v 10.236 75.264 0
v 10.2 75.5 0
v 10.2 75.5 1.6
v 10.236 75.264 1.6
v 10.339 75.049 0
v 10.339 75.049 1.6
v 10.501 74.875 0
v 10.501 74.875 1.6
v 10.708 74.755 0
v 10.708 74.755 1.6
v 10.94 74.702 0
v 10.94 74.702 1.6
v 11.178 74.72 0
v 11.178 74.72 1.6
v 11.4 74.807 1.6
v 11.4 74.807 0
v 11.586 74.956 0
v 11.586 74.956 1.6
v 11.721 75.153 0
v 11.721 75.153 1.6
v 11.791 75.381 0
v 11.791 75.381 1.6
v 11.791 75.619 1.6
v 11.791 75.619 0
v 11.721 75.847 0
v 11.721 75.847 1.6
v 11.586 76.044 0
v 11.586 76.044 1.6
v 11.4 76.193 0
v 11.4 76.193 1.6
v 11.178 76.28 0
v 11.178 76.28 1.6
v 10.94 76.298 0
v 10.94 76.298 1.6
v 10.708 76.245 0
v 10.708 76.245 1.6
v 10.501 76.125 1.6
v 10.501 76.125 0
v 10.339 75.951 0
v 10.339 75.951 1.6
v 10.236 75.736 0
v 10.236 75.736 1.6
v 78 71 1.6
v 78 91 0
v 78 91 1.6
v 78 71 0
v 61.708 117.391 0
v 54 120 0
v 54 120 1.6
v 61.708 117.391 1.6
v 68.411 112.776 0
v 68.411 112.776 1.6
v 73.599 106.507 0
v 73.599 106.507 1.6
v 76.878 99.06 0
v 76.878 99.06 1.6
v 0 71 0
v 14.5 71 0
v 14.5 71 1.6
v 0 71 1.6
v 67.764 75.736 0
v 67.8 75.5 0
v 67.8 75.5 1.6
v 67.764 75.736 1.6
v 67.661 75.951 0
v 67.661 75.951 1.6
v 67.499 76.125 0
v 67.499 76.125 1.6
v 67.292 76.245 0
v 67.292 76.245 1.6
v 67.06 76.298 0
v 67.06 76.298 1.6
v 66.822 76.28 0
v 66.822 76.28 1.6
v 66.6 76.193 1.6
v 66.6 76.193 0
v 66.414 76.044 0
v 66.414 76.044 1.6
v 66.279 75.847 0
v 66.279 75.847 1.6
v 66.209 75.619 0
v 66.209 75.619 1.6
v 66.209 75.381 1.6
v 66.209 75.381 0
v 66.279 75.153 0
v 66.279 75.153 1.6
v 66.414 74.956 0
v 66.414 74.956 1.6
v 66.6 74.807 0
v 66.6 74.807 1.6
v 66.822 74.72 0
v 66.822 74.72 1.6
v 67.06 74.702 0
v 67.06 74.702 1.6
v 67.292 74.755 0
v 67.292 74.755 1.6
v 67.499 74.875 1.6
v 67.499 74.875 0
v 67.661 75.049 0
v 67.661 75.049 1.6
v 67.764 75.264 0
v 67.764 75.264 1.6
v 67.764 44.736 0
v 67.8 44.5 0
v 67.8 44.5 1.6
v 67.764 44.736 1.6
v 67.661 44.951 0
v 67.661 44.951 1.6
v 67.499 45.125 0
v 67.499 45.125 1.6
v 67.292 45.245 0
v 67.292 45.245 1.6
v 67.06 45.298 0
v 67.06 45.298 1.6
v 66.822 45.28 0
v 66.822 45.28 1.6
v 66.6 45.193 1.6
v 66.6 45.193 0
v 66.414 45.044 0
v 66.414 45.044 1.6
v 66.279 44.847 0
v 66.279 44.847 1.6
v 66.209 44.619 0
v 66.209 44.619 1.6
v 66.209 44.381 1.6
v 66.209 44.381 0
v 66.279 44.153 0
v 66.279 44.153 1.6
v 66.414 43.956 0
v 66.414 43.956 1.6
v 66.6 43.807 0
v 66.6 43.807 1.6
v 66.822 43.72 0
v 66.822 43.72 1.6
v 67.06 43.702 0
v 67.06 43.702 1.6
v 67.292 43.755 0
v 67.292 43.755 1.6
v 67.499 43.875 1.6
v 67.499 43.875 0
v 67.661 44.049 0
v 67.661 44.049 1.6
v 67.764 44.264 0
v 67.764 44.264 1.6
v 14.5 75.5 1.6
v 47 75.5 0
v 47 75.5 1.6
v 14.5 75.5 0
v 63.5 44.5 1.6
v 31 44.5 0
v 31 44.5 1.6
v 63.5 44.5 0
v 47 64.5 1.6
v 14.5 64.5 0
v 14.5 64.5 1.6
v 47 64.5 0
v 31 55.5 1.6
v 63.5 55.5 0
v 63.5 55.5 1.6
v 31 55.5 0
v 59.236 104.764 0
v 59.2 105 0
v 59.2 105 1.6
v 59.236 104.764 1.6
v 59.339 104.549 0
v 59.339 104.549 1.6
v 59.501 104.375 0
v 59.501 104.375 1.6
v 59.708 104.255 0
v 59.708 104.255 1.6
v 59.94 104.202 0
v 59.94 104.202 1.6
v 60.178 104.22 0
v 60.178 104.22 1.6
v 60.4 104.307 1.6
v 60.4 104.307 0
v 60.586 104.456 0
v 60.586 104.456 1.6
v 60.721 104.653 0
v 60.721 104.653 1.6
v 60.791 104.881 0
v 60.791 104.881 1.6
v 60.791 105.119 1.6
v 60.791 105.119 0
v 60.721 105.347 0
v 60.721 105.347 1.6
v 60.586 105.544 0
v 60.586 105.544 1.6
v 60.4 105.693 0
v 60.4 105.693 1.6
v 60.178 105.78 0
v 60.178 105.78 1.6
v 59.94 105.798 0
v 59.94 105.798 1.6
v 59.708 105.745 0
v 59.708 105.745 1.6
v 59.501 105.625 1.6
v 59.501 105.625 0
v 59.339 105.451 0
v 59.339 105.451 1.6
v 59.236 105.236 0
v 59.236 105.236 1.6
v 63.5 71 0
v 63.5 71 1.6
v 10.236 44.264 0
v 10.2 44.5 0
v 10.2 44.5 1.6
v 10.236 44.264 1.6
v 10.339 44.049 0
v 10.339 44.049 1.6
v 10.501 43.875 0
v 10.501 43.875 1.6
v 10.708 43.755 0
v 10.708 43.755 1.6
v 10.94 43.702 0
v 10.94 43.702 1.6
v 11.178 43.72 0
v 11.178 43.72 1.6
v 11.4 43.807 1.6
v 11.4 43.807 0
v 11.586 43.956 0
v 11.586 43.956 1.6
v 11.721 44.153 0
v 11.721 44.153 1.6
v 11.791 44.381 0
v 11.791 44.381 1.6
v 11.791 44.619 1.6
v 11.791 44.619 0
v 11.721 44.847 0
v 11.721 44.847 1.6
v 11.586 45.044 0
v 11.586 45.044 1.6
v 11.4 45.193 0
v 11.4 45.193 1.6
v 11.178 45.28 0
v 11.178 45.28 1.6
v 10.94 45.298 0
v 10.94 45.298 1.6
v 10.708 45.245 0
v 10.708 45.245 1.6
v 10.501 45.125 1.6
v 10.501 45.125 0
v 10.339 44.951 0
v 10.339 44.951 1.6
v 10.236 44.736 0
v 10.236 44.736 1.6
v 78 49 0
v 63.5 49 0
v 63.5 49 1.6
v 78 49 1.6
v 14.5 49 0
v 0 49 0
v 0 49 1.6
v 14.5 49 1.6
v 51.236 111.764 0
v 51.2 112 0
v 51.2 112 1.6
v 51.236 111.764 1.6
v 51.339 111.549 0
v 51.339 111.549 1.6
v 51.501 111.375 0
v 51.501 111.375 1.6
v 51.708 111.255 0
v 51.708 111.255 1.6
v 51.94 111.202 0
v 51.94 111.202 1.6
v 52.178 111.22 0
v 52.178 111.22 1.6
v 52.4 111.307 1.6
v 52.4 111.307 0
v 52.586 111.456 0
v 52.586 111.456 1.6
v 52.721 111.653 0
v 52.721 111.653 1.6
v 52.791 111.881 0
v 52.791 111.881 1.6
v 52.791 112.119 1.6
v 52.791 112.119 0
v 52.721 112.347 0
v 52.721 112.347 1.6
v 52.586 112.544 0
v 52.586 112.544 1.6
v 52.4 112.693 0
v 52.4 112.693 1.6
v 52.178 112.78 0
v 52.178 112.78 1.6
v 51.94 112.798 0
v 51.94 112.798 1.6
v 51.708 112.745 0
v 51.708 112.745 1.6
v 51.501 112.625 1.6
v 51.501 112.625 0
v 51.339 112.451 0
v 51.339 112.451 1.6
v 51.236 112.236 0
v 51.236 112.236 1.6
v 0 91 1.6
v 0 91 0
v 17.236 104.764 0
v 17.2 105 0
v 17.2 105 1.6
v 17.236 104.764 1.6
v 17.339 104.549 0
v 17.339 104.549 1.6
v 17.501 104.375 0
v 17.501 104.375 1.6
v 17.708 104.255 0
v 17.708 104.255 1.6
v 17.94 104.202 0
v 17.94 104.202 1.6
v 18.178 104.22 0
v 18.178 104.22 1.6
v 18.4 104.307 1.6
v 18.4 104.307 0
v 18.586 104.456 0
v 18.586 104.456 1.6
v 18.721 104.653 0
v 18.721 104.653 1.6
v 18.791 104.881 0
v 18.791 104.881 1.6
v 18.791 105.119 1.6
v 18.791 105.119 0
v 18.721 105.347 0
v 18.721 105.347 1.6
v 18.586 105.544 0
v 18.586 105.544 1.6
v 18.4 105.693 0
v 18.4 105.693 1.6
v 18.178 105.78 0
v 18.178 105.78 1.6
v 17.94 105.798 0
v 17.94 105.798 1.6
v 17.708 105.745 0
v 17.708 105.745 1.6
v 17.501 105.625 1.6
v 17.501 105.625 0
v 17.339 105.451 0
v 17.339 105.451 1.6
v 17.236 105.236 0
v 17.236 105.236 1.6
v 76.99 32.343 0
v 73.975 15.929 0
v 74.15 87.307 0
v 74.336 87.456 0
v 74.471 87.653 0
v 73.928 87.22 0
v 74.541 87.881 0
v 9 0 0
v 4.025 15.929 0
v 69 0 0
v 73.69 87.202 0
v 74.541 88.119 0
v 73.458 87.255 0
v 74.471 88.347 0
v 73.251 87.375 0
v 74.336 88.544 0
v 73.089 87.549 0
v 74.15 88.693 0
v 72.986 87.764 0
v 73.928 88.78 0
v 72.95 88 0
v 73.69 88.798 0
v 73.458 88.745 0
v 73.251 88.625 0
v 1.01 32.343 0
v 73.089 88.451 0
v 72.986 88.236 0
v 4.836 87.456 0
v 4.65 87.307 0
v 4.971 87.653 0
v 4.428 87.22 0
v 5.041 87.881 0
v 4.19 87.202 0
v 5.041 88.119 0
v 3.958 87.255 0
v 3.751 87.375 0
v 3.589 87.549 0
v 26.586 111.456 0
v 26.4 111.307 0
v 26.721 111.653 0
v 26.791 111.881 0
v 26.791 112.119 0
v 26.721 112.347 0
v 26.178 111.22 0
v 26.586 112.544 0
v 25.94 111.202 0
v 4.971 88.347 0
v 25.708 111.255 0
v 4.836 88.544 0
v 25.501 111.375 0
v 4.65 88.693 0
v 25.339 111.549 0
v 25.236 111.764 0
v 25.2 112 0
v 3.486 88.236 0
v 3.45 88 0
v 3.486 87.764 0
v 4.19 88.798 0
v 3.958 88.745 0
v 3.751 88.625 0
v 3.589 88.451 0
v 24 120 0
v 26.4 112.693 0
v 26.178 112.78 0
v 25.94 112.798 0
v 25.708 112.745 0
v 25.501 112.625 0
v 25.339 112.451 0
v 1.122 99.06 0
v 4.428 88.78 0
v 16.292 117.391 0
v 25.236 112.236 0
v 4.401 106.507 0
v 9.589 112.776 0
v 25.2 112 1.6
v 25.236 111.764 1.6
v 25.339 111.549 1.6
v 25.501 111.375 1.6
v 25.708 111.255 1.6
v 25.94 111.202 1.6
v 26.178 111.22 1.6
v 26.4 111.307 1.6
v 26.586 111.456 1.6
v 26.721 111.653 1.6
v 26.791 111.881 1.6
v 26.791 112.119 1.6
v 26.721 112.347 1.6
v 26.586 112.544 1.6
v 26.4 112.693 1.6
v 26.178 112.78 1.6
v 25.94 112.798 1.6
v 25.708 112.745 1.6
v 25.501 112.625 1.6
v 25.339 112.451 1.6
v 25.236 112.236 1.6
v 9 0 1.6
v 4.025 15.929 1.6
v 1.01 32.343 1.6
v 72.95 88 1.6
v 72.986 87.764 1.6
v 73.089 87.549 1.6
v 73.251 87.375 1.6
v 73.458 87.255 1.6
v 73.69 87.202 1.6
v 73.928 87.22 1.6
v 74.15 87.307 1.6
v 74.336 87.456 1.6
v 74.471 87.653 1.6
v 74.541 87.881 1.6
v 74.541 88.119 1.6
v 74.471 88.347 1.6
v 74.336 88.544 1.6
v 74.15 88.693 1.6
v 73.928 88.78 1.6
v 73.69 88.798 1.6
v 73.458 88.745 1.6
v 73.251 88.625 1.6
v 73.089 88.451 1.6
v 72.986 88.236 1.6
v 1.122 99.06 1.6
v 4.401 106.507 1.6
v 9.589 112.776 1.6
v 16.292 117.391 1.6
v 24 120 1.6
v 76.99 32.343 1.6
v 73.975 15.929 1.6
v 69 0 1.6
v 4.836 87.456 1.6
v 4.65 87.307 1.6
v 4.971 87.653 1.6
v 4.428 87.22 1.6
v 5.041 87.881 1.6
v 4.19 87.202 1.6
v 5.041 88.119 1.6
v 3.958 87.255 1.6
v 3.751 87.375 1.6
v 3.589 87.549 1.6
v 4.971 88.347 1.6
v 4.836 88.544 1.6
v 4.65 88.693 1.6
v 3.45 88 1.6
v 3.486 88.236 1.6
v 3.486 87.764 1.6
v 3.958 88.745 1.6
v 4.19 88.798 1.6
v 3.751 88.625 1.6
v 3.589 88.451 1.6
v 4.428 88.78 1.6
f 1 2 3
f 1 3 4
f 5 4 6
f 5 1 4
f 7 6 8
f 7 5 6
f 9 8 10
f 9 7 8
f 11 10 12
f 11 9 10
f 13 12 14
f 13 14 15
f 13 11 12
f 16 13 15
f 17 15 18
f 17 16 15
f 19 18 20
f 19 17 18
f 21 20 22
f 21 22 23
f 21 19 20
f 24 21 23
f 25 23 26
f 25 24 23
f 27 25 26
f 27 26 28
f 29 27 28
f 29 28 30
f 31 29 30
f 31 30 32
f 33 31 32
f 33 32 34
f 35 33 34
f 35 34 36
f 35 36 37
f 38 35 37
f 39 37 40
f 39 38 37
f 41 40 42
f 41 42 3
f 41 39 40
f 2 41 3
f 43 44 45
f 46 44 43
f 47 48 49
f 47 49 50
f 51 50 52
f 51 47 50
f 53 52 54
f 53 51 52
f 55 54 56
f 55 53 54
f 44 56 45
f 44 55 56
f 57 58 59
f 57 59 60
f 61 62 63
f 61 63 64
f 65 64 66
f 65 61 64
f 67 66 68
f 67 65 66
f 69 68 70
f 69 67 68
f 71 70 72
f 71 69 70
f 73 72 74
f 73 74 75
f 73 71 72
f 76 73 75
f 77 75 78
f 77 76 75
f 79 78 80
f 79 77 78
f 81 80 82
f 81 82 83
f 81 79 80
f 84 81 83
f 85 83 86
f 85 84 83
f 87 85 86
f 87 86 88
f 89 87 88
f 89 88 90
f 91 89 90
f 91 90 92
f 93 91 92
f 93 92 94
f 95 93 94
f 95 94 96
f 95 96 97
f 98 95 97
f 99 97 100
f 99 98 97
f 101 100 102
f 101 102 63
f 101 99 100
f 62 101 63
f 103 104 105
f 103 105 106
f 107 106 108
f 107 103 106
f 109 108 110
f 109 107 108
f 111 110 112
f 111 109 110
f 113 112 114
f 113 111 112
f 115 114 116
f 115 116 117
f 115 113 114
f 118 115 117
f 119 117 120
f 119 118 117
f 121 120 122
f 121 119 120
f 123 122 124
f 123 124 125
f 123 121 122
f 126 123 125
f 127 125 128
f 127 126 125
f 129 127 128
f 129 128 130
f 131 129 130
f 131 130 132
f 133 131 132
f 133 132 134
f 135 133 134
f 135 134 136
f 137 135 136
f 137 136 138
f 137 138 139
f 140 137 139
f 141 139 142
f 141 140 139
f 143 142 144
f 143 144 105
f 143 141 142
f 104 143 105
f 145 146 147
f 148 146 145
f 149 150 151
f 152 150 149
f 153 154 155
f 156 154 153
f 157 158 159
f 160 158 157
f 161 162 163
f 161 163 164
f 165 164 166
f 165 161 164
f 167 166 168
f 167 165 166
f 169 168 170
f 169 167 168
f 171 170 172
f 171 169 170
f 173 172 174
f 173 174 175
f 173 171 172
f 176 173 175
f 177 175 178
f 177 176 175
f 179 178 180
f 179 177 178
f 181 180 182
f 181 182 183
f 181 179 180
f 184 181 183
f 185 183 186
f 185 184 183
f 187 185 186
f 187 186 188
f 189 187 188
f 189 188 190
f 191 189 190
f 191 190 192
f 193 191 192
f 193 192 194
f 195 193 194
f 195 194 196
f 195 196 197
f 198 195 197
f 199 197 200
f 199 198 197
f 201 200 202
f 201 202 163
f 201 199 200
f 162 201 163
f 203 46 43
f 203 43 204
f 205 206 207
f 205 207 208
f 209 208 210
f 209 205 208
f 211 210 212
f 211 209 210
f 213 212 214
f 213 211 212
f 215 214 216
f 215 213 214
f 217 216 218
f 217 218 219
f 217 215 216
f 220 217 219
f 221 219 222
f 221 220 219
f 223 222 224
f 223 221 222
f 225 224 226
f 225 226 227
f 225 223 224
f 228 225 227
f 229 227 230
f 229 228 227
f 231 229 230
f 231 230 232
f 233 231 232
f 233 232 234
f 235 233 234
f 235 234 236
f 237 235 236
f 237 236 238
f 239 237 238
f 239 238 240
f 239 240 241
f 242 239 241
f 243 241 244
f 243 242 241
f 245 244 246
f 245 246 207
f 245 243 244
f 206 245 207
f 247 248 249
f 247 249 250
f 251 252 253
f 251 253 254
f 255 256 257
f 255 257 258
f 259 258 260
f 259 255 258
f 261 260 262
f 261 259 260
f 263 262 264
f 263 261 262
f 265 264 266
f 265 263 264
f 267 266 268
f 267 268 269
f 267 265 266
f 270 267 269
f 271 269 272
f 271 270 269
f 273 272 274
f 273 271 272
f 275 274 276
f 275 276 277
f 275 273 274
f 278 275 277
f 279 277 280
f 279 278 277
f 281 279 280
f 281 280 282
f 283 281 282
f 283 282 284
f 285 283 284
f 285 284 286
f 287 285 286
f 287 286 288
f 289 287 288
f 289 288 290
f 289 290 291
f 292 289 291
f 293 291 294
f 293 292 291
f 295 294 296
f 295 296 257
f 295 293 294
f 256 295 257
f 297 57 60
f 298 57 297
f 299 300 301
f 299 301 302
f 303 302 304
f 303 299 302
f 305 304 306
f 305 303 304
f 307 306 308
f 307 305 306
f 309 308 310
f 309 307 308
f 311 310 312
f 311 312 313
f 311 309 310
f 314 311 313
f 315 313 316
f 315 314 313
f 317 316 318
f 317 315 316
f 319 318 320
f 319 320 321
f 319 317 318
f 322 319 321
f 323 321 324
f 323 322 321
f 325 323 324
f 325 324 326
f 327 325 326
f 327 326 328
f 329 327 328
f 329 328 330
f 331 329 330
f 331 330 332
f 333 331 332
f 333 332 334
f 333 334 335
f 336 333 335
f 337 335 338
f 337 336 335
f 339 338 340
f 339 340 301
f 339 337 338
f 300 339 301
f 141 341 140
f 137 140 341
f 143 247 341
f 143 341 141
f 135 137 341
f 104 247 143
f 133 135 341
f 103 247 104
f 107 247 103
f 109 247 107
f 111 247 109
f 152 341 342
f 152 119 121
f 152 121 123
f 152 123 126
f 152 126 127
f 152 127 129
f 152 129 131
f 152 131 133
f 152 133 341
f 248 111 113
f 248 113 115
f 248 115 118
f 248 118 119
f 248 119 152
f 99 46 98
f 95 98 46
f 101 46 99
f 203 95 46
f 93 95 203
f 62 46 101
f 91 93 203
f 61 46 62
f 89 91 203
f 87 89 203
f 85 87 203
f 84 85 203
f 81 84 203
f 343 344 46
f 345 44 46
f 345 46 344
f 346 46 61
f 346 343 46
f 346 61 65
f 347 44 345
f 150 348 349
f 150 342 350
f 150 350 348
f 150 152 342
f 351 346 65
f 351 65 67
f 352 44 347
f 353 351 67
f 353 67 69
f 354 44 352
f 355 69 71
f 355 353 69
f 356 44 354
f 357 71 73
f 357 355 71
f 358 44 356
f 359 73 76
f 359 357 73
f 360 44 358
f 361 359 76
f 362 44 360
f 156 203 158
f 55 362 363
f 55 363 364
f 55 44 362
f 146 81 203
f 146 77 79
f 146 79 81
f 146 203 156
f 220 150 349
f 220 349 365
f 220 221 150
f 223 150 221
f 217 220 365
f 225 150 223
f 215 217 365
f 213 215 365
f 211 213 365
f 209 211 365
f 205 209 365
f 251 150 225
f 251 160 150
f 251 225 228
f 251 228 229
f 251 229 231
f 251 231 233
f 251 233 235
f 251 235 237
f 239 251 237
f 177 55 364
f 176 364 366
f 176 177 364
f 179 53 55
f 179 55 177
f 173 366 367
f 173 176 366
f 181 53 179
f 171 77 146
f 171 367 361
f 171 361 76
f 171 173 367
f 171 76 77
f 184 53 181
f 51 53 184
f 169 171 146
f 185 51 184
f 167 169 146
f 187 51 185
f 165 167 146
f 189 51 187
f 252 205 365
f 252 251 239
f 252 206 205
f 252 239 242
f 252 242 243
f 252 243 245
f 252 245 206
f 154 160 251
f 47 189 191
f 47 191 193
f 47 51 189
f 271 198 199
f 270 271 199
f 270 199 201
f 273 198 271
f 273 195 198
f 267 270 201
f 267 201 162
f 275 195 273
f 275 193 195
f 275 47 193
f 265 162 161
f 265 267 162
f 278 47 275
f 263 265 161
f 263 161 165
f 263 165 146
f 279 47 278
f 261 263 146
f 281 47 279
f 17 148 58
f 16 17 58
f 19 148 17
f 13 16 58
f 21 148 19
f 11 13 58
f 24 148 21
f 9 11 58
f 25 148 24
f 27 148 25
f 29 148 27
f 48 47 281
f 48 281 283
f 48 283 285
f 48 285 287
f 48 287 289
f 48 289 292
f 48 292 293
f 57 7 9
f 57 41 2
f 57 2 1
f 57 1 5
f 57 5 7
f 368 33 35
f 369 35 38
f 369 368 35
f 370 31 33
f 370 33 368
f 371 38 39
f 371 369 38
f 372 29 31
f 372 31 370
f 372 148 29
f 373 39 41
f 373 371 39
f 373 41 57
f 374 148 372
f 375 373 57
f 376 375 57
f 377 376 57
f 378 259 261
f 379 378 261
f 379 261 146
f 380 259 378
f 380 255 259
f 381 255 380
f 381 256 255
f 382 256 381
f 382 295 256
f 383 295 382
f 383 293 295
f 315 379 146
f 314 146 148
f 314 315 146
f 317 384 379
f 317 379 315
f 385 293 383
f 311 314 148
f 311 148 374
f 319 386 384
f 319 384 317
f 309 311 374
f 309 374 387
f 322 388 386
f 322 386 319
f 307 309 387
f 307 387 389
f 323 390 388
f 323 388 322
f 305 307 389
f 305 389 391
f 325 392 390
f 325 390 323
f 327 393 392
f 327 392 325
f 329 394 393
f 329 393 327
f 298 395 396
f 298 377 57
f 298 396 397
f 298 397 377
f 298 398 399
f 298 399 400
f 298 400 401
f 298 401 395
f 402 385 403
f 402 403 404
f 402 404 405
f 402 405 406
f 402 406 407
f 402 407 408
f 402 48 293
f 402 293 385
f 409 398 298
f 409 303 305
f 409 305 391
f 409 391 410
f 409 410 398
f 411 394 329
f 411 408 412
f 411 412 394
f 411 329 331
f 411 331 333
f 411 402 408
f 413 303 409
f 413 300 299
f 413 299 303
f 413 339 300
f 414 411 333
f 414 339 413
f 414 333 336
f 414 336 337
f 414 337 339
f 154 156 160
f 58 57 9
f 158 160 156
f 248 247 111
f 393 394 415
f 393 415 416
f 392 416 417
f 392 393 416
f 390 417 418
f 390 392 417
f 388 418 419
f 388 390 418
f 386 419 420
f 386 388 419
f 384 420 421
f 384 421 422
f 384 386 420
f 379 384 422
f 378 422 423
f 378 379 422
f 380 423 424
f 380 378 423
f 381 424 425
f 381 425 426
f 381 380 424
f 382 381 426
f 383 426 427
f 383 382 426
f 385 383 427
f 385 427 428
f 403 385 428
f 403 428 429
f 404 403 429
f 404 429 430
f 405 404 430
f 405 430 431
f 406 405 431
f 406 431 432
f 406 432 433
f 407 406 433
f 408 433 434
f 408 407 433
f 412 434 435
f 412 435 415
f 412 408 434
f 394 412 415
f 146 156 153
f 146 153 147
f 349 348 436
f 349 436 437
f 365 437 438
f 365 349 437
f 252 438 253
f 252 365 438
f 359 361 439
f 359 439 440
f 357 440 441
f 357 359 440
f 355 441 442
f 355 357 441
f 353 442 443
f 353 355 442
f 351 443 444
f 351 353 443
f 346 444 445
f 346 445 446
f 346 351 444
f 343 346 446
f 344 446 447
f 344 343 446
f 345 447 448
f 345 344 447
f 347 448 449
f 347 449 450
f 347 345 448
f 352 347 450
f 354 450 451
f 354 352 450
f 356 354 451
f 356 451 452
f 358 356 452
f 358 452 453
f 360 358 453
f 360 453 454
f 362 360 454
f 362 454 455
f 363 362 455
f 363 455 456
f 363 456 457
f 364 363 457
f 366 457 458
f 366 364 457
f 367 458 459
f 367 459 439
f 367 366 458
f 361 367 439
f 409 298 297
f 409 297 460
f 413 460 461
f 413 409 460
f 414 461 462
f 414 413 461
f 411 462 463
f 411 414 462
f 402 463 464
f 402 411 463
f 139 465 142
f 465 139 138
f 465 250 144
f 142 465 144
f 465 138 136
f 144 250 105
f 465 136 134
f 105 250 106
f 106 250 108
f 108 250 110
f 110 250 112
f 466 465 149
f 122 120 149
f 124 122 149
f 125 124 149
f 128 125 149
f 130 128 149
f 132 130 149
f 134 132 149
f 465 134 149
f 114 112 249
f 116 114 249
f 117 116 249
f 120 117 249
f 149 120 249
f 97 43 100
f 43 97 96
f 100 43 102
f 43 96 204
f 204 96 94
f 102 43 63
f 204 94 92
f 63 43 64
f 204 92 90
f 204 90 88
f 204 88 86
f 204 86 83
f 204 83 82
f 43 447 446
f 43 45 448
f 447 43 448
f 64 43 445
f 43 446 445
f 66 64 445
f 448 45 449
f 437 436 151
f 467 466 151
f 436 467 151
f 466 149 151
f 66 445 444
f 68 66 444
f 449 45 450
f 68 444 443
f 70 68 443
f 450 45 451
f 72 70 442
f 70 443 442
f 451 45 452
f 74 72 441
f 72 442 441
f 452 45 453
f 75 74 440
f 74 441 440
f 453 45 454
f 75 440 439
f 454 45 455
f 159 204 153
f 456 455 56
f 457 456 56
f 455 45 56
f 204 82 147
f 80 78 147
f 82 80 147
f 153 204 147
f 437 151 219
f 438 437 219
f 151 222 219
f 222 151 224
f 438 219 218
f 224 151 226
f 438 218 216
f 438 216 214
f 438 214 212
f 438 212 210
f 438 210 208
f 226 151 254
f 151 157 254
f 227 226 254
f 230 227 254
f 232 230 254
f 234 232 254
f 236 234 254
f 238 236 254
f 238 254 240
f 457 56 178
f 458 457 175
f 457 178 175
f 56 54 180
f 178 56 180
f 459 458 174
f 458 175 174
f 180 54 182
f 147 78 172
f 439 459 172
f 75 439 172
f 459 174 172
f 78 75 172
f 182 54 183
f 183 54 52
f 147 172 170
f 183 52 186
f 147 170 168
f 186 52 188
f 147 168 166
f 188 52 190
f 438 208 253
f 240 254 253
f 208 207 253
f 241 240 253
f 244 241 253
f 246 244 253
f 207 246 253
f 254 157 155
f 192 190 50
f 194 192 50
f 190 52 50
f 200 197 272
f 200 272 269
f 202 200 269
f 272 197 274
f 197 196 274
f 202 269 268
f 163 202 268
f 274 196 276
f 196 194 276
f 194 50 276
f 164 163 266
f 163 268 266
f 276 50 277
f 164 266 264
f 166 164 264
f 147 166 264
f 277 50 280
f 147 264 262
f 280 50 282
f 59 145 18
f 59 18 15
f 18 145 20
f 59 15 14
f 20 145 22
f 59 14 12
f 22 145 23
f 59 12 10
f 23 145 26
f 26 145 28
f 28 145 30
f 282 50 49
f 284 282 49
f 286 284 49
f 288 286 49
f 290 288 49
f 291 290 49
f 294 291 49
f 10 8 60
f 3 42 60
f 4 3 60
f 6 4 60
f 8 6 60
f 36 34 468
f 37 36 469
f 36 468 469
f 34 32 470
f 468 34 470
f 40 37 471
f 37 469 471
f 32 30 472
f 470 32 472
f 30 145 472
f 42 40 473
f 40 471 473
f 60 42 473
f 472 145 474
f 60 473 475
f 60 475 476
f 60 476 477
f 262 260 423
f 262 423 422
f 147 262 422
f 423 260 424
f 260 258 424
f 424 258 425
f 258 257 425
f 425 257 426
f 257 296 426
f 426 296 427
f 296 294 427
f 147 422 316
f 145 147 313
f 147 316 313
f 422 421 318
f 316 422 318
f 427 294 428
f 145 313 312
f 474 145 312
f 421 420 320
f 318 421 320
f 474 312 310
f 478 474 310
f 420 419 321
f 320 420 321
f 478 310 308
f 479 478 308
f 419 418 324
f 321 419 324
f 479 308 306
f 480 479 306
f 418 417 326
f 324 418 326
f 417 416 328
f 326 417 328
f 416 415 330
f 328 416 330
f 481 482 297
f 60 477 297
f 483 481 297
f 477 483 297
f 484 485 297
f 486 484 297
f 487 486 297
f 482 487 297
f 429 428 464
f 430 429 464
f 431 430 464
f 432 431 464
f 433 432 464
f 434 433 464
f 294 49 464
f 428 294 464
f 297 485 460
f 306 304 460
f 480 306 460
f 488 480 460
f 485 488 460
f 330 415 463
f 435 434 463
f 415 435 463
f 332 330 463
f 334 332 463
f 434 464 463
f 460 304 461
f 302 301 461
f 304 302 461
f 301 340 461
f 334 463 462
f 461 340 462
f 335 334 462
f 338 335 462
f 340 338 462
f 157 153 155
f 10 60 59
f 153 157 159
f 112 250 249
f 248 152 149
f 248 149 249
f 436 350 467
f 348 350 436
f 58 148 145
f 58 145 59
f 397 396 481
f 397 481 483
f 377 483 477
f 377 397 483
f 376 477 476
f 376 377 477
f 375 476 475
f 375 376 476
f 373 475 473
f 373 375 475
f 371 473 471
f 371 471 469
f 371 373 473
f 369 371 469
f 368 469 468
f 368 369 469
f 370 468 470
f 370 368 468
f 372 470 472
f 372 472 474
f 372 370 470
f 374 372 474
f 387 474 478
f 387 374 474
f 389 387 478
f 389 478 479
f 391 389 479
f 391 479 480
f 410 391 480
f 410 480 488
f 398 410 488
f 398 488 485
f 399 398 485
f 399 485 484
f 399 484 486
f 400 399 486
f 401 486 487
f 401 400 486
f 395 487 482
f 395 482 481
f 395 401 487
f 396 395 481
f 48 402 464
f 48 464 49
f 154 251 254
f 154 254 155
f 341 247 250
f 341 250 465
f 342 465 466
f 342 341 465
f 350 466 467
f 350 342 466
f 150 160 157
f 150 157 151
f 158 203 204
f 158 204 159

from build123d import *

# Parameters (mm, degrees)
SKETCH_1_R      = 0.8
EXTRUDE_1_DEPTH = 1.6


with BuildPart() as part:
    # 스케치1 → 돌출1 (new body)
    with BuildSketch(Plane.XY):
        with BuildLine():
            Line((39, 0), (9, 0))
            ThreePointArc((9, 0), (2.268662967, 24.090162586), (0, 49))
            Line((0, 49), (14.5, 49))
            Line((14.5, 49), (14.5, 64.5))
            Line((14.5, 64.5), (47, 64.5))
            Line((47, 64.5), (47, 75.5))
            Line((47, 75.5), (14.5, 75.5))
            Line((14.5, 75.5), (14.5, 71))
            Line((14.5, 71), (0, 71))
            Line((0, 71), (0, 91))
            ThreePointArc((0, 91), (6.778150978, 109.821530225), (24, 120))
            Line((24, 120), (39, 120))
            Line((39, 120), (54, 120))
            ThreePointArc((54, 120), (71.221849022, 109.821530225), (78, 91))
            Line((78, 91), (78, 71))
            Line((78, 71), (63.5, 71))
            Line((63.5, 71), (63.5, 55.5))
            Line((63.5, 55.5), (31, 55.5))
            Line((31, 55.5), (31, 44.5))
            Line((31, 44.5), (63.5, 44.5))
            Line((63.5, 44.5), (63.5, 49))
            Line((63.5, 49), (78, 49))
            ThreePointArc((78, 49), (75.731337033, 24.090162586), (69, 0))
            Line((69, 0), (39, 0))
        make_face()
        with Locations((67, 75.5)):
            Circle(SKETCH_1_R, mode=Mode.SUBTRACT)
        with Locations((67, 44.5)):
            Circle(SKETCH_1_R, mode=Mode.SUBTRACT)
        with Locations(Location((11, 44.5, 0), (0, 0, 180))):
            Circle(SKETCH_1_R, mode=Mode.SUBTRACT)
        with Locations(Location((11, 75.5, 0), (0, 0, 180))):
            Circle(SKETCH_1_R, mode=Mode.SUBTRACT)
        with Locations(Location((4.25, 88, 0), (0, 0, 180))):
            Circle(SKETCH_1_R, mode=Mode.SUBTRACT)
        with Locations(Location((73.75, 88, 0), (0, 0, 180))):
            Circle(SKETCH_1_R, mode=Mode.SUBTRACT)
        with Locations(Location((18, 105, 0), (0, 0, 180))):
            Circle(SKETCH_1_R, mode=Mode.SUBTRACT)
        with Locations(Location((60, 105, 0), (0, 0, 180))):
            Circle(SKETCH_1_R, mode=Mode.SUBTRACT)
        with Locations(Location((26, 112, 0), (0, 0, 180))):
            Circle(SKETCH_1_R, mode=Mode.SUBTRACT)
        with Locations(Location((52, 112, 0), (0, 0, 180))):
            Circle(SKETCH_1_R, mode=Mode.SUBTRACT)
    extrude(amount=EXTRUDE_1_DEPTH)


solid = part.part
